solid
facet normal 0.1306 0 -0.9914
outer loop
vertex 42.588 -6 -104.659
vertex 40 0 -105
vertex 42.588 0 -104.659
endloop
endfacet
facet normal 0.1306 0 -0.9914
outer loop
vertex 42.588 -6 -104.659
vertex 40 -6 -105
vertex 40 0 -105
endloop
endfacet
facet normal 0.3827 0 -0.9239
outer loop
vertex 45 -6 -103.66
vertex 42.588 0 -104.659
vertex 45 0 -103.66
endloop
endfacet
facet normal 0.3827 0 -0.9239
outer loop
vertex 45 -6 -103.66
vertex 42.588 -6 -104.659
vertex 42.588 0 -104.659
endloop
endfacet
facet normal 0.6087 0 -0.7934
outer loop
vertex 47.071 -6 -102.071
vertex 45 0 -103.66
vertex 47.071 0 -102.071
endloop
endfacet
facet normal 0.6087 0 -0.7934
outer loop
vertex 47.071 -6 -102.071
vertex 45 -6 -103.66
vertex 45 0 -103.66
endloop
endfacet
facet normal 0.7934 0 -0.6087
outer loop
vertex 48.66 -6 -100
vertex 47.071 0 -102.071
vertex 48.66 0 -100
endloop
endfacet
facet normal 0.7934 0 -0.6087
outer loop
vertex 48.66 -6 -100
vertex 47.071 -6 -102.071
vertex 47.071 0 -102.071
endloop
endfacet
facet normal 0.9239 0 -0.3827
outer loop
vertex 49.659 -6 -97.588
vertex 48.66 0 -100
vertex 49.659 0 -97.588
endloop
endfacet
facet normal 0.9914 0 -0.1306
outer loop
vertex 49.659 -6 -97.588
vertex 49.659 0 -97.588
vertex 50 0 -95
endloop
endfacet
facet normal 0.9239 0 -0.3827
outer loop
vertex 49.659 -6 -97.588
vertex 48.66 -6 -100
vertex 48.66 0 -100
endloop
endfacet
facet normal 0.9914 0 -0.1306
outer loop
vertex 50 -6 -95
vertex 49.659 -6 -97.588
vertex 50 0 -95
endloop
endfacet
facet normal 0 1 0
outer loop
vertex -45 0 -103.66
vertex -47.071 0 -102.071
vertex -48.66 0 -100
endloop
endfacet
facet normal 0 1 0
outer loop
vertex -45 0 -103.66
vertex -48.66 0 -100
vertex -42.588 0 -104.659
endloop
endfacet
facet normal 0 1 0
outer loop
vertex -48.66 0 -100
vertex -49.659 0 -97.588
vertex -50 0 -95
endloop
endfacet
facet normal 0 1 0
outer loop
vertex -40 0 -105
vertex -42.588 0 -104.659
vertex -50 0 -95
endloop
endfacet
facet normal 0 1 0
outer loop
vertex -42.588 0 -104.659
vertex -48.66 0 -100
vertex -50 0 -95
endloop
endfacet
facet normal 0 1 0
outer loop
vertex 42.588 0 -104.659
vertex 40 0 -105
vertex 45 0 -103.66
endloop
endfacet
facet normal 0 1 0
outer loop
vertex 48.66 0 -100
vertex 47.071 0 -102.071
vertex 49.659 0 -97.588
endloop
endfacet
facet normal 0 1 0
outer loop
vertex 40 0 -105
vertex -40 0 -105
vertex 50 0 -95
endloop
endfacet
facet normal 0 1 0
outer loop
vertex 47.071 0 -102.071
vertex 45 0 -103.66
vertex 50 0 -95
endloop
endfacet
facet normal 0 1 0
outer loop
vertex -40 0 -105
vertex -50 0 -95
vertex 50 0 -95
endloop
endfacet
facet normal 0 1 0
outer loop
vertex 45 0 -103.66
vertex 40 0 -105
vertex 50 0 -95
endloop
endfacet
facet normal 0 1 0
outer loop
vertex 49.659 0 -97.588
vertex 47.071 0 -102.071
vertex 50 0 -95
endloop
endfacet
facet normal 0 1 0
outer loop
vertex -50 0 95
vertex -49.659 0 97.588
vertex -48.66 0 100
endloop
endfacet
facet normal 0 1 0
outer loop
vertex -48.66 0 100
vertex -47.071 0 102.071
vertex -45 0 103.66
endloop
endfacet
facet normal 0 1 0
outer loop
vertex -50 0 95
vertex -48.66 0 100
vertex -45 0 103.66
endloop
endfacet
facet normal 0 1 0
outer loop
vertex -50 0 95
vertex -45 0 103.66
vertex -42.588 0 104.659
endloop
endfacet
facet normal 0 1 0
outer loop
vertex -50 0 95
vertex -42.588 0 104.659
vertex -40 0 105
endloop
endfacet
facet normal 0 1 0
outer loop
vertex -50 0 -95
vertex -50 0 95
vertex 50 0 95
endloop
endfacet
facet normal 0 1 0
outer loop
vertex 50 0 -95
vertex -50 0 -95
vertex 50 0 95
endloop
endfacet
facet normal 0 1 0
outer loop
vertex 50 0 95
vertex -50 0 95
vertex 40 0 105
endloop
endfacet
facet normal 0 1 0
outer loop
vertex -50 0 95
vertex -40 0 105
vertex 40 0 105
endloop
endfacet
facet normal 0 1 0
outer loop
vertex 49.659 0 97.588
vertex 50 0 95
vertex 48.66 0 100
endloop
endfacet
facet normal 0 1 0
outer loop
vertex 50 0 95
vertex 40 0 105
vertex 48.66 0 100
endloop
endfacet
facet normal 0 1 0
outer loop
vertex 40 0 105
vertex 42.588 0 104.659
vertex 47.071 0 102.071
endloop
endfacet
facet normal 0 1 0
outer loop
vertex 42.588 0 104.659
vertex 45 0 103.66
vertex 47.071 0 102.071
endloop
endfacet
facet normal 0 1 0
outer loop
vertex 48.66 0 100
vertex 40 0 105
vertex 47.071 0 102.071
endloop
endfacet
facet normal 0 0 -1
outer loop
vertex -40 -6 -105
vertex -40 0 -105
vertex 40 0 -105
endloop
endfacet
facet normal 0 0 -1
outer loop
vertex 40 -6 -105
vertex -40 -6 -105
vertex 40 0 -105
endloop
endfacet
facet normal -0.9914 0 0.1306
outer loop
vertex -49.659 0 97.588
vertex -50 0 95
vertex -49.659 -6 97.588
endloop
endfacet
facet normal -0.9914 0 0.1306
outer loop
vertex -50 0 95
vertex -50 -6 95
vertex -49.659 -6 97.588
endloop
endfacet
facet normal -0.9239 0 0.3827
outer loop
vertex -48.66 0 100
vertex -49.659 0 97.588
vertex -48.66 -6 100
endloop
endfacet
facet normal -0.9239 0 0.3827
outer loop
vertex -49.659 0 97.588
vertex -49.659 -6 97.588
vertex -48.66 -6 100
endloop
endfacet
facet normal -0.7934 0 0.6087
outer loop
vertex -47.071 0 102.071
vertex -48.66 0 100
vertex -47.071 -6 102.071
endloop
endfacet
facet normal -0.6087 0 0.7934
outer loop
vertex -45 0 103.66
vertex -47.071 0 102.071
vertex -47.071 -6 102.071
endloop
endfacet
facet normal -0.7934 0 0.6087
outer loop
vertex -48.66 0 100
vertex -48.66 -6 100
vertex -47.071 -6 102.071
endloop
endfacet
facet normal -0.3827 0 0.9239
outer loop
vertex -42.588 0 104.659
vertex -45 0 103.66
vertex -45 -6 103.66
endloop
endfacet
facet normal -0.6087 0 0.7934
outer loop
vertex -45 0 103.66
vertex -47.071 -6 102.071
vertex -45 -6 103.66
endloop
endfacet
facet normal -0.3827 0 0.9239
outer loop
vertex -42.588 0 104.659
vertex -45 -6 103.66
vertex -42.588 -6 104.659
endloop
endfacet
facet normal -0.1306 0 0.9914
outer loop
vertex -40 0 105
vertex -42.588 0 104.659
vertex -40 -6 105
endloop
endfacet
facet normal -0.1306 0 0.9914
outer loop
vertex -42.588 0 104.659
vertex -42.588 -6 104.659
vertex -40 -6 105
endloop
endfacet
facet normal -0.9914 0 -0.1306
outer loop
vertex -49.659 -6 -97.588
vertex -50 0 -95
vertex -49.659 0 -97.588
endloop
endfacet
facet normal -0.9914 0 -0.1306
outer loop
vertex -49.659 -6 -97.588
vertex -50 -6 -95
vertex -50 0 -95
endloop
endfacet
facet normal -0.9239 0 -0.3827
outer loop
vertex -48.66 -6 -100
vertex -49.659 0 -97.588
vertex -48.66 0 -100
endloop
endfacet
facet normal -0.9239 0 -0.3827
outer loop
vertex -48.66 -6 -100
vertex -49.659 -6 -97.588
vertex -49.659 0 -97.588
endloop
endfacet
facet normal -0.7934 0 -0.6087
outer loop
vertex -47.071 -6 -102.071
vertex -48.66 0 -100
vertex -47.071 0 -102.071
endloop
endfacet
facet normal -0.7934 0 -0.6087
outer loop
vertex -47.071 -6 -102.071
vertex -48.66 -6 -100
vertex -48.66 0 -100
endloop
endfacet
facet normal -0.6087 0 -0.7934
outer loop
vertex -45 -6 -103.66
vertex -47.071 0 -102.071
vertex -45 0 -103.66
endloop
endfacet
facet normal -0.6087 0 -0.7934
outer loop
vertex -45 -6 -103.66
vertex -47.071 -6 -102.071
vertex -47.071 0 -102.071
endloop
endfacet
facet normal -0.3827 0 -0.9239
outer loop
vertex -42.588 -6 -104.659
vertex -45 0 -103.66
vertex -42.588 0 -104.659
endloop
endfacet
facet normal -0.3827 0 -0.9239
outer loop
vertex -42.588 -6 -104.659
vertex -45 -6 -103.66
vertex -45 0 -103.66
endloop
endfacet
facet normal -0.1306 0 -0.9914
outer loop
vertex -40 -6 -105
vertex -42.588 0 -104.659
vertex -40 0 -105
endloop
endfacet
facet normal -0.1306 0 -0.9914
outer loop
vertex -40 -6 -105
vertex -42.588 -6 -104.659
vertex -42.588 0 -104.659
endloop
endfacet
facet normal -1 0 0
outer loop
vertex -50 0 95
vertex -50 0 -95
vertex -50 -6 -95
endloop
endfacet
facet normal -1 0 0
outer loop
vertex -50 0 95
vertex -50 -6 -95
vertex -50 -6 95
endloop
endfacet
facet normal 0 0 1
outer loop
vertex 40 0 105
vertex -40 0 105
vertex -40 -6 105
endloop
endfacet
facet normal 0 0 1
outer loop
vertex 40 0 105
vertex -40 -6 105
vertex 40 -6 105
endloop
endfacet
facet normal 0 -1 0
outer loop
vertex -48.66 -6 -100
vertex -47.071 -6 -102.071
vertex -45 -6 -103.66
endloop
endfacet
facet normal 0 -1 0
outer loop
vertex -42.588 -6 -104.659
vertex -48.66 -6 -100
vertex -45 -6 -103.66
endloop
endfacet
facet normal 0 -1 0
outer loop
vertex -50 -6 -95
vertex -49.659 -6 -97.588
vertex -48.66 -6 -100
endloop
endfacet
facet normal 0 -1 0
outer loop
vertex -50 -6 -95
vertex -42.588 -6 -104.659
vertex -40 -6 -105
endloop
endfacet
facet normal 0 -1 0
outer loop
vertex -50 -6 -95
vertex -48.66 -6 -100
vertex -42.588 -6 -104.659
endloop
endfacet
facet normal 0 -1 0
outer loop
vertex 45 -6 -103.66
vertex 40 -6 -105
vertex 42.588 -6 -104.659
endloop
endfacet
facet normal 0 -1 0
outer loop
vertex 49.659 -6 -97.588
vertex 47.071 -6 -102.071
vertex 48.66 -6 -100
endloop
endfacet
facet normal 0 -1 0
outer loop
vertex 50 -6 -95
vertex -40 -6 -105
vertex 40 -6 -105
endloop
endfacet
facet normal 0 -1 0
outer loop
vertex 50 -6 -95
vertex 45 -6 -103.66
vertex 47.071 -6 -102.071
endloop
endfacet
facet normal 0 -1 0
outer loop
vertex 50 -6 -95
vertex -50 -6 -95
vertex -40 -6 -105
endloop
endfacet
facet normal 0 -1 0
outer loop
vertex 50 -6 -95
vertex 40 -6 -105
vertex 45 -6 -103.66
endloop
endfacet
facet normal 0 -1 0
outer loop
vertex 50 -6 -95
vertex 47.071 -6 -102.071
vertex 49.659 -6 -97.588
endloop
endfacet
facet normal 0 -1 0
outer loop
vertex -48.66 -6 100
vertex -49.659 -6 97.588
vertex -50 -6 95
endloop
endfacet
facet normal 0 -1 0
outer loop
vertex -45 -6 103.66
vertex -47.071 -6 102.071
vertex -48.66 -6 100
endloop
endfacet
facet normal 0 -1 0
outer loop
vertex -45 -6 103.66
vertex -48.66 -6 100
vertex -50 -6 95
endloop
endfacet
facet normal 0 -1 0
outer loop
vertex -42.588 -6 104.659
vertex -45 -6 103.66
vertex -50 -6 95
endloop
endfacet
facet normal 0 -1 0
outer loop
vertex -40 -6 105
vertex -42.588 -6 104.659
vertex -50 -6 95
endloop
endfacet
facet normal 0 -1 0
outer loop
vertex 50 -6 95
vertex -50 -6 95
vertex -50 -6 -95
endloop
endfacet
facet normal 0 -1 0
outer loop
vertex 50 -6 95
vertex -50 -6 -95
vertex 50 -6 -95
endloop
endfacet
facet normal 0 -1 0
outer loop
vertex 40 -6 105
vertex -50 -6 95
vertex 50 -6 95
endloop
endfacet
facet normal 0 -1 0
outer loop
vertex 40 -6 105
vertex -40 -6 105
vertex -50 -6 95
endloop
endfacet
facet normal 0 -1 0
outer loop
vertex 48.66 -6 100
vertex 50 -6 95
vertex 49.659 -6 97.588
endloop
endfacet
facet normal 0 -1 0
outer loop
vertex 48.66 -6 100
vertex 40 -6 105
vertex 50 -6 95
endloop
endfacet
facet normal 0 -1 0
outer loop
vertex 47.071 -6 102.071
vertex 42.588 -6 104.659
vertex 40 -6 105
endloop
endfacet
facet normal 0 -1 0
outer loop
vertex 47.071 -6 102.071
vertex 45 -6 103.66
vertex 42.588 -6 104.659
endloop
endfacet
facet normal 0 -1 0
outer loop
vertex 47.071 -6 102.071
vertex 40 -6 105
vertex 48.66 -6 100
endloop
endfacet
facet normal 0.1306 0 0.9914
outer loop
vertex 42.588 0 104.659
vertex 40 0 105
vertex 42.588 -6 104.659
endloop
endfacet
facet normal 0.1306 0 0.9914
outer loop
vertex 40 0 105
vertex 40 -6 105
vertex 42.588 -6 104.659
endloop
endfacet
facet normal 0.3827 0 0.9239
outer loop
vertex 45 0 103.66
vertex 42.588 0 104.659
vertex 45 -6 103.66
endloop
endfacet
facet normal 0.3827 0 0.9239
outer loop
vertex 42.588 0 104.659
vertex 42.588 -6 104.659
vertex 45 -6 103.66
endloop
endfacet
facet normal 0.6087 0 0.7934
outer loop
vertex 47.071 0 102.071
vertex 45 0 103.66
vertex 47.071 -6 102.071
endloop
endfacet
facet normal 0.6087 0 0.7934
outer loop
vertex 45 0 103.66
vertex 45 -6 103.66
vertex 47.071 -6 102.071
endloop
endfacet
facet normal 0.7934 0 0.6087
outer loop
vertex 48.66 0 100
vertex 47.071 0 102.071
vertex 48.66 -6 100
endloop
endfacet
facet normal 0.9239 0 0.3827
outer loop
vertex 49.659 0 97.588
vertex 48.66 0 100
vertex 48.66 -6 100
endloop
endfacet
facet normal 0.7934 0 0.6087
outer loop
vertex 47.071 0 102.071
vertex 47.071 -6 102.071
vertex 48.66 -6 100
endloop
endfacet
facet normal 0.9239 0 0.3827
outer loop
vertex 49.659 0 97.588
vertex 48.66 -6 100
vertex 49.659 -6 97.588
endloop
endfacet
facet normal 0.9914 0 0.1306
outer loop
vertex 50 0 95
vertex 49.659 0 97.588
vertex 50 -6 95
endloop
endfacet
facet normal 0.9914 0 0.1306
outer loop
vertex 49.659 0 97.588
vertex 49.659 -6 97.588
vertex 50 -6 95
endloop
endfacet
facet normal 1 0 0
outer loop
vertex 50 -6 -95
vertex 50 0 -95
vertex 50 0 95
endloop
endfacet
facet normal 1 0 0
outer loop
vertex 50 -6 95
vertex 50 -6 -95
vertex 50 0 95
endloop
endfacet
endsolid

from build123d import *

# Parameters (mm, degrees)
F0_W     = 100
F0_H     = 210
F1_DEPTH = 6
F2_R     = 10
F3_R     = 10


with BuildPart() as f1:
    # F0 (on Front) → F1 (new body)
    with BuildSketch(Plane.XZ):
        Rectangle(F0_W, F0_H)
    extrude(amount=F1_DEPTH)

    # F2
    f2_edges = [f1.edges().sort_by_distance(p)[0] for p in [
        (-50, -3, -105),
        (50, -3, -105),
    ]]
    fillet(f2_edges, radius=F2_R)

    # F3
    f3_edges = [f1.edges().sort_by_distance(p)[0] for p in [
        (-50, -3, 105),
        (50, -3, 105),
    ]]
    fillet(f3_edges, radius=F3_R)


solid = f1.part
